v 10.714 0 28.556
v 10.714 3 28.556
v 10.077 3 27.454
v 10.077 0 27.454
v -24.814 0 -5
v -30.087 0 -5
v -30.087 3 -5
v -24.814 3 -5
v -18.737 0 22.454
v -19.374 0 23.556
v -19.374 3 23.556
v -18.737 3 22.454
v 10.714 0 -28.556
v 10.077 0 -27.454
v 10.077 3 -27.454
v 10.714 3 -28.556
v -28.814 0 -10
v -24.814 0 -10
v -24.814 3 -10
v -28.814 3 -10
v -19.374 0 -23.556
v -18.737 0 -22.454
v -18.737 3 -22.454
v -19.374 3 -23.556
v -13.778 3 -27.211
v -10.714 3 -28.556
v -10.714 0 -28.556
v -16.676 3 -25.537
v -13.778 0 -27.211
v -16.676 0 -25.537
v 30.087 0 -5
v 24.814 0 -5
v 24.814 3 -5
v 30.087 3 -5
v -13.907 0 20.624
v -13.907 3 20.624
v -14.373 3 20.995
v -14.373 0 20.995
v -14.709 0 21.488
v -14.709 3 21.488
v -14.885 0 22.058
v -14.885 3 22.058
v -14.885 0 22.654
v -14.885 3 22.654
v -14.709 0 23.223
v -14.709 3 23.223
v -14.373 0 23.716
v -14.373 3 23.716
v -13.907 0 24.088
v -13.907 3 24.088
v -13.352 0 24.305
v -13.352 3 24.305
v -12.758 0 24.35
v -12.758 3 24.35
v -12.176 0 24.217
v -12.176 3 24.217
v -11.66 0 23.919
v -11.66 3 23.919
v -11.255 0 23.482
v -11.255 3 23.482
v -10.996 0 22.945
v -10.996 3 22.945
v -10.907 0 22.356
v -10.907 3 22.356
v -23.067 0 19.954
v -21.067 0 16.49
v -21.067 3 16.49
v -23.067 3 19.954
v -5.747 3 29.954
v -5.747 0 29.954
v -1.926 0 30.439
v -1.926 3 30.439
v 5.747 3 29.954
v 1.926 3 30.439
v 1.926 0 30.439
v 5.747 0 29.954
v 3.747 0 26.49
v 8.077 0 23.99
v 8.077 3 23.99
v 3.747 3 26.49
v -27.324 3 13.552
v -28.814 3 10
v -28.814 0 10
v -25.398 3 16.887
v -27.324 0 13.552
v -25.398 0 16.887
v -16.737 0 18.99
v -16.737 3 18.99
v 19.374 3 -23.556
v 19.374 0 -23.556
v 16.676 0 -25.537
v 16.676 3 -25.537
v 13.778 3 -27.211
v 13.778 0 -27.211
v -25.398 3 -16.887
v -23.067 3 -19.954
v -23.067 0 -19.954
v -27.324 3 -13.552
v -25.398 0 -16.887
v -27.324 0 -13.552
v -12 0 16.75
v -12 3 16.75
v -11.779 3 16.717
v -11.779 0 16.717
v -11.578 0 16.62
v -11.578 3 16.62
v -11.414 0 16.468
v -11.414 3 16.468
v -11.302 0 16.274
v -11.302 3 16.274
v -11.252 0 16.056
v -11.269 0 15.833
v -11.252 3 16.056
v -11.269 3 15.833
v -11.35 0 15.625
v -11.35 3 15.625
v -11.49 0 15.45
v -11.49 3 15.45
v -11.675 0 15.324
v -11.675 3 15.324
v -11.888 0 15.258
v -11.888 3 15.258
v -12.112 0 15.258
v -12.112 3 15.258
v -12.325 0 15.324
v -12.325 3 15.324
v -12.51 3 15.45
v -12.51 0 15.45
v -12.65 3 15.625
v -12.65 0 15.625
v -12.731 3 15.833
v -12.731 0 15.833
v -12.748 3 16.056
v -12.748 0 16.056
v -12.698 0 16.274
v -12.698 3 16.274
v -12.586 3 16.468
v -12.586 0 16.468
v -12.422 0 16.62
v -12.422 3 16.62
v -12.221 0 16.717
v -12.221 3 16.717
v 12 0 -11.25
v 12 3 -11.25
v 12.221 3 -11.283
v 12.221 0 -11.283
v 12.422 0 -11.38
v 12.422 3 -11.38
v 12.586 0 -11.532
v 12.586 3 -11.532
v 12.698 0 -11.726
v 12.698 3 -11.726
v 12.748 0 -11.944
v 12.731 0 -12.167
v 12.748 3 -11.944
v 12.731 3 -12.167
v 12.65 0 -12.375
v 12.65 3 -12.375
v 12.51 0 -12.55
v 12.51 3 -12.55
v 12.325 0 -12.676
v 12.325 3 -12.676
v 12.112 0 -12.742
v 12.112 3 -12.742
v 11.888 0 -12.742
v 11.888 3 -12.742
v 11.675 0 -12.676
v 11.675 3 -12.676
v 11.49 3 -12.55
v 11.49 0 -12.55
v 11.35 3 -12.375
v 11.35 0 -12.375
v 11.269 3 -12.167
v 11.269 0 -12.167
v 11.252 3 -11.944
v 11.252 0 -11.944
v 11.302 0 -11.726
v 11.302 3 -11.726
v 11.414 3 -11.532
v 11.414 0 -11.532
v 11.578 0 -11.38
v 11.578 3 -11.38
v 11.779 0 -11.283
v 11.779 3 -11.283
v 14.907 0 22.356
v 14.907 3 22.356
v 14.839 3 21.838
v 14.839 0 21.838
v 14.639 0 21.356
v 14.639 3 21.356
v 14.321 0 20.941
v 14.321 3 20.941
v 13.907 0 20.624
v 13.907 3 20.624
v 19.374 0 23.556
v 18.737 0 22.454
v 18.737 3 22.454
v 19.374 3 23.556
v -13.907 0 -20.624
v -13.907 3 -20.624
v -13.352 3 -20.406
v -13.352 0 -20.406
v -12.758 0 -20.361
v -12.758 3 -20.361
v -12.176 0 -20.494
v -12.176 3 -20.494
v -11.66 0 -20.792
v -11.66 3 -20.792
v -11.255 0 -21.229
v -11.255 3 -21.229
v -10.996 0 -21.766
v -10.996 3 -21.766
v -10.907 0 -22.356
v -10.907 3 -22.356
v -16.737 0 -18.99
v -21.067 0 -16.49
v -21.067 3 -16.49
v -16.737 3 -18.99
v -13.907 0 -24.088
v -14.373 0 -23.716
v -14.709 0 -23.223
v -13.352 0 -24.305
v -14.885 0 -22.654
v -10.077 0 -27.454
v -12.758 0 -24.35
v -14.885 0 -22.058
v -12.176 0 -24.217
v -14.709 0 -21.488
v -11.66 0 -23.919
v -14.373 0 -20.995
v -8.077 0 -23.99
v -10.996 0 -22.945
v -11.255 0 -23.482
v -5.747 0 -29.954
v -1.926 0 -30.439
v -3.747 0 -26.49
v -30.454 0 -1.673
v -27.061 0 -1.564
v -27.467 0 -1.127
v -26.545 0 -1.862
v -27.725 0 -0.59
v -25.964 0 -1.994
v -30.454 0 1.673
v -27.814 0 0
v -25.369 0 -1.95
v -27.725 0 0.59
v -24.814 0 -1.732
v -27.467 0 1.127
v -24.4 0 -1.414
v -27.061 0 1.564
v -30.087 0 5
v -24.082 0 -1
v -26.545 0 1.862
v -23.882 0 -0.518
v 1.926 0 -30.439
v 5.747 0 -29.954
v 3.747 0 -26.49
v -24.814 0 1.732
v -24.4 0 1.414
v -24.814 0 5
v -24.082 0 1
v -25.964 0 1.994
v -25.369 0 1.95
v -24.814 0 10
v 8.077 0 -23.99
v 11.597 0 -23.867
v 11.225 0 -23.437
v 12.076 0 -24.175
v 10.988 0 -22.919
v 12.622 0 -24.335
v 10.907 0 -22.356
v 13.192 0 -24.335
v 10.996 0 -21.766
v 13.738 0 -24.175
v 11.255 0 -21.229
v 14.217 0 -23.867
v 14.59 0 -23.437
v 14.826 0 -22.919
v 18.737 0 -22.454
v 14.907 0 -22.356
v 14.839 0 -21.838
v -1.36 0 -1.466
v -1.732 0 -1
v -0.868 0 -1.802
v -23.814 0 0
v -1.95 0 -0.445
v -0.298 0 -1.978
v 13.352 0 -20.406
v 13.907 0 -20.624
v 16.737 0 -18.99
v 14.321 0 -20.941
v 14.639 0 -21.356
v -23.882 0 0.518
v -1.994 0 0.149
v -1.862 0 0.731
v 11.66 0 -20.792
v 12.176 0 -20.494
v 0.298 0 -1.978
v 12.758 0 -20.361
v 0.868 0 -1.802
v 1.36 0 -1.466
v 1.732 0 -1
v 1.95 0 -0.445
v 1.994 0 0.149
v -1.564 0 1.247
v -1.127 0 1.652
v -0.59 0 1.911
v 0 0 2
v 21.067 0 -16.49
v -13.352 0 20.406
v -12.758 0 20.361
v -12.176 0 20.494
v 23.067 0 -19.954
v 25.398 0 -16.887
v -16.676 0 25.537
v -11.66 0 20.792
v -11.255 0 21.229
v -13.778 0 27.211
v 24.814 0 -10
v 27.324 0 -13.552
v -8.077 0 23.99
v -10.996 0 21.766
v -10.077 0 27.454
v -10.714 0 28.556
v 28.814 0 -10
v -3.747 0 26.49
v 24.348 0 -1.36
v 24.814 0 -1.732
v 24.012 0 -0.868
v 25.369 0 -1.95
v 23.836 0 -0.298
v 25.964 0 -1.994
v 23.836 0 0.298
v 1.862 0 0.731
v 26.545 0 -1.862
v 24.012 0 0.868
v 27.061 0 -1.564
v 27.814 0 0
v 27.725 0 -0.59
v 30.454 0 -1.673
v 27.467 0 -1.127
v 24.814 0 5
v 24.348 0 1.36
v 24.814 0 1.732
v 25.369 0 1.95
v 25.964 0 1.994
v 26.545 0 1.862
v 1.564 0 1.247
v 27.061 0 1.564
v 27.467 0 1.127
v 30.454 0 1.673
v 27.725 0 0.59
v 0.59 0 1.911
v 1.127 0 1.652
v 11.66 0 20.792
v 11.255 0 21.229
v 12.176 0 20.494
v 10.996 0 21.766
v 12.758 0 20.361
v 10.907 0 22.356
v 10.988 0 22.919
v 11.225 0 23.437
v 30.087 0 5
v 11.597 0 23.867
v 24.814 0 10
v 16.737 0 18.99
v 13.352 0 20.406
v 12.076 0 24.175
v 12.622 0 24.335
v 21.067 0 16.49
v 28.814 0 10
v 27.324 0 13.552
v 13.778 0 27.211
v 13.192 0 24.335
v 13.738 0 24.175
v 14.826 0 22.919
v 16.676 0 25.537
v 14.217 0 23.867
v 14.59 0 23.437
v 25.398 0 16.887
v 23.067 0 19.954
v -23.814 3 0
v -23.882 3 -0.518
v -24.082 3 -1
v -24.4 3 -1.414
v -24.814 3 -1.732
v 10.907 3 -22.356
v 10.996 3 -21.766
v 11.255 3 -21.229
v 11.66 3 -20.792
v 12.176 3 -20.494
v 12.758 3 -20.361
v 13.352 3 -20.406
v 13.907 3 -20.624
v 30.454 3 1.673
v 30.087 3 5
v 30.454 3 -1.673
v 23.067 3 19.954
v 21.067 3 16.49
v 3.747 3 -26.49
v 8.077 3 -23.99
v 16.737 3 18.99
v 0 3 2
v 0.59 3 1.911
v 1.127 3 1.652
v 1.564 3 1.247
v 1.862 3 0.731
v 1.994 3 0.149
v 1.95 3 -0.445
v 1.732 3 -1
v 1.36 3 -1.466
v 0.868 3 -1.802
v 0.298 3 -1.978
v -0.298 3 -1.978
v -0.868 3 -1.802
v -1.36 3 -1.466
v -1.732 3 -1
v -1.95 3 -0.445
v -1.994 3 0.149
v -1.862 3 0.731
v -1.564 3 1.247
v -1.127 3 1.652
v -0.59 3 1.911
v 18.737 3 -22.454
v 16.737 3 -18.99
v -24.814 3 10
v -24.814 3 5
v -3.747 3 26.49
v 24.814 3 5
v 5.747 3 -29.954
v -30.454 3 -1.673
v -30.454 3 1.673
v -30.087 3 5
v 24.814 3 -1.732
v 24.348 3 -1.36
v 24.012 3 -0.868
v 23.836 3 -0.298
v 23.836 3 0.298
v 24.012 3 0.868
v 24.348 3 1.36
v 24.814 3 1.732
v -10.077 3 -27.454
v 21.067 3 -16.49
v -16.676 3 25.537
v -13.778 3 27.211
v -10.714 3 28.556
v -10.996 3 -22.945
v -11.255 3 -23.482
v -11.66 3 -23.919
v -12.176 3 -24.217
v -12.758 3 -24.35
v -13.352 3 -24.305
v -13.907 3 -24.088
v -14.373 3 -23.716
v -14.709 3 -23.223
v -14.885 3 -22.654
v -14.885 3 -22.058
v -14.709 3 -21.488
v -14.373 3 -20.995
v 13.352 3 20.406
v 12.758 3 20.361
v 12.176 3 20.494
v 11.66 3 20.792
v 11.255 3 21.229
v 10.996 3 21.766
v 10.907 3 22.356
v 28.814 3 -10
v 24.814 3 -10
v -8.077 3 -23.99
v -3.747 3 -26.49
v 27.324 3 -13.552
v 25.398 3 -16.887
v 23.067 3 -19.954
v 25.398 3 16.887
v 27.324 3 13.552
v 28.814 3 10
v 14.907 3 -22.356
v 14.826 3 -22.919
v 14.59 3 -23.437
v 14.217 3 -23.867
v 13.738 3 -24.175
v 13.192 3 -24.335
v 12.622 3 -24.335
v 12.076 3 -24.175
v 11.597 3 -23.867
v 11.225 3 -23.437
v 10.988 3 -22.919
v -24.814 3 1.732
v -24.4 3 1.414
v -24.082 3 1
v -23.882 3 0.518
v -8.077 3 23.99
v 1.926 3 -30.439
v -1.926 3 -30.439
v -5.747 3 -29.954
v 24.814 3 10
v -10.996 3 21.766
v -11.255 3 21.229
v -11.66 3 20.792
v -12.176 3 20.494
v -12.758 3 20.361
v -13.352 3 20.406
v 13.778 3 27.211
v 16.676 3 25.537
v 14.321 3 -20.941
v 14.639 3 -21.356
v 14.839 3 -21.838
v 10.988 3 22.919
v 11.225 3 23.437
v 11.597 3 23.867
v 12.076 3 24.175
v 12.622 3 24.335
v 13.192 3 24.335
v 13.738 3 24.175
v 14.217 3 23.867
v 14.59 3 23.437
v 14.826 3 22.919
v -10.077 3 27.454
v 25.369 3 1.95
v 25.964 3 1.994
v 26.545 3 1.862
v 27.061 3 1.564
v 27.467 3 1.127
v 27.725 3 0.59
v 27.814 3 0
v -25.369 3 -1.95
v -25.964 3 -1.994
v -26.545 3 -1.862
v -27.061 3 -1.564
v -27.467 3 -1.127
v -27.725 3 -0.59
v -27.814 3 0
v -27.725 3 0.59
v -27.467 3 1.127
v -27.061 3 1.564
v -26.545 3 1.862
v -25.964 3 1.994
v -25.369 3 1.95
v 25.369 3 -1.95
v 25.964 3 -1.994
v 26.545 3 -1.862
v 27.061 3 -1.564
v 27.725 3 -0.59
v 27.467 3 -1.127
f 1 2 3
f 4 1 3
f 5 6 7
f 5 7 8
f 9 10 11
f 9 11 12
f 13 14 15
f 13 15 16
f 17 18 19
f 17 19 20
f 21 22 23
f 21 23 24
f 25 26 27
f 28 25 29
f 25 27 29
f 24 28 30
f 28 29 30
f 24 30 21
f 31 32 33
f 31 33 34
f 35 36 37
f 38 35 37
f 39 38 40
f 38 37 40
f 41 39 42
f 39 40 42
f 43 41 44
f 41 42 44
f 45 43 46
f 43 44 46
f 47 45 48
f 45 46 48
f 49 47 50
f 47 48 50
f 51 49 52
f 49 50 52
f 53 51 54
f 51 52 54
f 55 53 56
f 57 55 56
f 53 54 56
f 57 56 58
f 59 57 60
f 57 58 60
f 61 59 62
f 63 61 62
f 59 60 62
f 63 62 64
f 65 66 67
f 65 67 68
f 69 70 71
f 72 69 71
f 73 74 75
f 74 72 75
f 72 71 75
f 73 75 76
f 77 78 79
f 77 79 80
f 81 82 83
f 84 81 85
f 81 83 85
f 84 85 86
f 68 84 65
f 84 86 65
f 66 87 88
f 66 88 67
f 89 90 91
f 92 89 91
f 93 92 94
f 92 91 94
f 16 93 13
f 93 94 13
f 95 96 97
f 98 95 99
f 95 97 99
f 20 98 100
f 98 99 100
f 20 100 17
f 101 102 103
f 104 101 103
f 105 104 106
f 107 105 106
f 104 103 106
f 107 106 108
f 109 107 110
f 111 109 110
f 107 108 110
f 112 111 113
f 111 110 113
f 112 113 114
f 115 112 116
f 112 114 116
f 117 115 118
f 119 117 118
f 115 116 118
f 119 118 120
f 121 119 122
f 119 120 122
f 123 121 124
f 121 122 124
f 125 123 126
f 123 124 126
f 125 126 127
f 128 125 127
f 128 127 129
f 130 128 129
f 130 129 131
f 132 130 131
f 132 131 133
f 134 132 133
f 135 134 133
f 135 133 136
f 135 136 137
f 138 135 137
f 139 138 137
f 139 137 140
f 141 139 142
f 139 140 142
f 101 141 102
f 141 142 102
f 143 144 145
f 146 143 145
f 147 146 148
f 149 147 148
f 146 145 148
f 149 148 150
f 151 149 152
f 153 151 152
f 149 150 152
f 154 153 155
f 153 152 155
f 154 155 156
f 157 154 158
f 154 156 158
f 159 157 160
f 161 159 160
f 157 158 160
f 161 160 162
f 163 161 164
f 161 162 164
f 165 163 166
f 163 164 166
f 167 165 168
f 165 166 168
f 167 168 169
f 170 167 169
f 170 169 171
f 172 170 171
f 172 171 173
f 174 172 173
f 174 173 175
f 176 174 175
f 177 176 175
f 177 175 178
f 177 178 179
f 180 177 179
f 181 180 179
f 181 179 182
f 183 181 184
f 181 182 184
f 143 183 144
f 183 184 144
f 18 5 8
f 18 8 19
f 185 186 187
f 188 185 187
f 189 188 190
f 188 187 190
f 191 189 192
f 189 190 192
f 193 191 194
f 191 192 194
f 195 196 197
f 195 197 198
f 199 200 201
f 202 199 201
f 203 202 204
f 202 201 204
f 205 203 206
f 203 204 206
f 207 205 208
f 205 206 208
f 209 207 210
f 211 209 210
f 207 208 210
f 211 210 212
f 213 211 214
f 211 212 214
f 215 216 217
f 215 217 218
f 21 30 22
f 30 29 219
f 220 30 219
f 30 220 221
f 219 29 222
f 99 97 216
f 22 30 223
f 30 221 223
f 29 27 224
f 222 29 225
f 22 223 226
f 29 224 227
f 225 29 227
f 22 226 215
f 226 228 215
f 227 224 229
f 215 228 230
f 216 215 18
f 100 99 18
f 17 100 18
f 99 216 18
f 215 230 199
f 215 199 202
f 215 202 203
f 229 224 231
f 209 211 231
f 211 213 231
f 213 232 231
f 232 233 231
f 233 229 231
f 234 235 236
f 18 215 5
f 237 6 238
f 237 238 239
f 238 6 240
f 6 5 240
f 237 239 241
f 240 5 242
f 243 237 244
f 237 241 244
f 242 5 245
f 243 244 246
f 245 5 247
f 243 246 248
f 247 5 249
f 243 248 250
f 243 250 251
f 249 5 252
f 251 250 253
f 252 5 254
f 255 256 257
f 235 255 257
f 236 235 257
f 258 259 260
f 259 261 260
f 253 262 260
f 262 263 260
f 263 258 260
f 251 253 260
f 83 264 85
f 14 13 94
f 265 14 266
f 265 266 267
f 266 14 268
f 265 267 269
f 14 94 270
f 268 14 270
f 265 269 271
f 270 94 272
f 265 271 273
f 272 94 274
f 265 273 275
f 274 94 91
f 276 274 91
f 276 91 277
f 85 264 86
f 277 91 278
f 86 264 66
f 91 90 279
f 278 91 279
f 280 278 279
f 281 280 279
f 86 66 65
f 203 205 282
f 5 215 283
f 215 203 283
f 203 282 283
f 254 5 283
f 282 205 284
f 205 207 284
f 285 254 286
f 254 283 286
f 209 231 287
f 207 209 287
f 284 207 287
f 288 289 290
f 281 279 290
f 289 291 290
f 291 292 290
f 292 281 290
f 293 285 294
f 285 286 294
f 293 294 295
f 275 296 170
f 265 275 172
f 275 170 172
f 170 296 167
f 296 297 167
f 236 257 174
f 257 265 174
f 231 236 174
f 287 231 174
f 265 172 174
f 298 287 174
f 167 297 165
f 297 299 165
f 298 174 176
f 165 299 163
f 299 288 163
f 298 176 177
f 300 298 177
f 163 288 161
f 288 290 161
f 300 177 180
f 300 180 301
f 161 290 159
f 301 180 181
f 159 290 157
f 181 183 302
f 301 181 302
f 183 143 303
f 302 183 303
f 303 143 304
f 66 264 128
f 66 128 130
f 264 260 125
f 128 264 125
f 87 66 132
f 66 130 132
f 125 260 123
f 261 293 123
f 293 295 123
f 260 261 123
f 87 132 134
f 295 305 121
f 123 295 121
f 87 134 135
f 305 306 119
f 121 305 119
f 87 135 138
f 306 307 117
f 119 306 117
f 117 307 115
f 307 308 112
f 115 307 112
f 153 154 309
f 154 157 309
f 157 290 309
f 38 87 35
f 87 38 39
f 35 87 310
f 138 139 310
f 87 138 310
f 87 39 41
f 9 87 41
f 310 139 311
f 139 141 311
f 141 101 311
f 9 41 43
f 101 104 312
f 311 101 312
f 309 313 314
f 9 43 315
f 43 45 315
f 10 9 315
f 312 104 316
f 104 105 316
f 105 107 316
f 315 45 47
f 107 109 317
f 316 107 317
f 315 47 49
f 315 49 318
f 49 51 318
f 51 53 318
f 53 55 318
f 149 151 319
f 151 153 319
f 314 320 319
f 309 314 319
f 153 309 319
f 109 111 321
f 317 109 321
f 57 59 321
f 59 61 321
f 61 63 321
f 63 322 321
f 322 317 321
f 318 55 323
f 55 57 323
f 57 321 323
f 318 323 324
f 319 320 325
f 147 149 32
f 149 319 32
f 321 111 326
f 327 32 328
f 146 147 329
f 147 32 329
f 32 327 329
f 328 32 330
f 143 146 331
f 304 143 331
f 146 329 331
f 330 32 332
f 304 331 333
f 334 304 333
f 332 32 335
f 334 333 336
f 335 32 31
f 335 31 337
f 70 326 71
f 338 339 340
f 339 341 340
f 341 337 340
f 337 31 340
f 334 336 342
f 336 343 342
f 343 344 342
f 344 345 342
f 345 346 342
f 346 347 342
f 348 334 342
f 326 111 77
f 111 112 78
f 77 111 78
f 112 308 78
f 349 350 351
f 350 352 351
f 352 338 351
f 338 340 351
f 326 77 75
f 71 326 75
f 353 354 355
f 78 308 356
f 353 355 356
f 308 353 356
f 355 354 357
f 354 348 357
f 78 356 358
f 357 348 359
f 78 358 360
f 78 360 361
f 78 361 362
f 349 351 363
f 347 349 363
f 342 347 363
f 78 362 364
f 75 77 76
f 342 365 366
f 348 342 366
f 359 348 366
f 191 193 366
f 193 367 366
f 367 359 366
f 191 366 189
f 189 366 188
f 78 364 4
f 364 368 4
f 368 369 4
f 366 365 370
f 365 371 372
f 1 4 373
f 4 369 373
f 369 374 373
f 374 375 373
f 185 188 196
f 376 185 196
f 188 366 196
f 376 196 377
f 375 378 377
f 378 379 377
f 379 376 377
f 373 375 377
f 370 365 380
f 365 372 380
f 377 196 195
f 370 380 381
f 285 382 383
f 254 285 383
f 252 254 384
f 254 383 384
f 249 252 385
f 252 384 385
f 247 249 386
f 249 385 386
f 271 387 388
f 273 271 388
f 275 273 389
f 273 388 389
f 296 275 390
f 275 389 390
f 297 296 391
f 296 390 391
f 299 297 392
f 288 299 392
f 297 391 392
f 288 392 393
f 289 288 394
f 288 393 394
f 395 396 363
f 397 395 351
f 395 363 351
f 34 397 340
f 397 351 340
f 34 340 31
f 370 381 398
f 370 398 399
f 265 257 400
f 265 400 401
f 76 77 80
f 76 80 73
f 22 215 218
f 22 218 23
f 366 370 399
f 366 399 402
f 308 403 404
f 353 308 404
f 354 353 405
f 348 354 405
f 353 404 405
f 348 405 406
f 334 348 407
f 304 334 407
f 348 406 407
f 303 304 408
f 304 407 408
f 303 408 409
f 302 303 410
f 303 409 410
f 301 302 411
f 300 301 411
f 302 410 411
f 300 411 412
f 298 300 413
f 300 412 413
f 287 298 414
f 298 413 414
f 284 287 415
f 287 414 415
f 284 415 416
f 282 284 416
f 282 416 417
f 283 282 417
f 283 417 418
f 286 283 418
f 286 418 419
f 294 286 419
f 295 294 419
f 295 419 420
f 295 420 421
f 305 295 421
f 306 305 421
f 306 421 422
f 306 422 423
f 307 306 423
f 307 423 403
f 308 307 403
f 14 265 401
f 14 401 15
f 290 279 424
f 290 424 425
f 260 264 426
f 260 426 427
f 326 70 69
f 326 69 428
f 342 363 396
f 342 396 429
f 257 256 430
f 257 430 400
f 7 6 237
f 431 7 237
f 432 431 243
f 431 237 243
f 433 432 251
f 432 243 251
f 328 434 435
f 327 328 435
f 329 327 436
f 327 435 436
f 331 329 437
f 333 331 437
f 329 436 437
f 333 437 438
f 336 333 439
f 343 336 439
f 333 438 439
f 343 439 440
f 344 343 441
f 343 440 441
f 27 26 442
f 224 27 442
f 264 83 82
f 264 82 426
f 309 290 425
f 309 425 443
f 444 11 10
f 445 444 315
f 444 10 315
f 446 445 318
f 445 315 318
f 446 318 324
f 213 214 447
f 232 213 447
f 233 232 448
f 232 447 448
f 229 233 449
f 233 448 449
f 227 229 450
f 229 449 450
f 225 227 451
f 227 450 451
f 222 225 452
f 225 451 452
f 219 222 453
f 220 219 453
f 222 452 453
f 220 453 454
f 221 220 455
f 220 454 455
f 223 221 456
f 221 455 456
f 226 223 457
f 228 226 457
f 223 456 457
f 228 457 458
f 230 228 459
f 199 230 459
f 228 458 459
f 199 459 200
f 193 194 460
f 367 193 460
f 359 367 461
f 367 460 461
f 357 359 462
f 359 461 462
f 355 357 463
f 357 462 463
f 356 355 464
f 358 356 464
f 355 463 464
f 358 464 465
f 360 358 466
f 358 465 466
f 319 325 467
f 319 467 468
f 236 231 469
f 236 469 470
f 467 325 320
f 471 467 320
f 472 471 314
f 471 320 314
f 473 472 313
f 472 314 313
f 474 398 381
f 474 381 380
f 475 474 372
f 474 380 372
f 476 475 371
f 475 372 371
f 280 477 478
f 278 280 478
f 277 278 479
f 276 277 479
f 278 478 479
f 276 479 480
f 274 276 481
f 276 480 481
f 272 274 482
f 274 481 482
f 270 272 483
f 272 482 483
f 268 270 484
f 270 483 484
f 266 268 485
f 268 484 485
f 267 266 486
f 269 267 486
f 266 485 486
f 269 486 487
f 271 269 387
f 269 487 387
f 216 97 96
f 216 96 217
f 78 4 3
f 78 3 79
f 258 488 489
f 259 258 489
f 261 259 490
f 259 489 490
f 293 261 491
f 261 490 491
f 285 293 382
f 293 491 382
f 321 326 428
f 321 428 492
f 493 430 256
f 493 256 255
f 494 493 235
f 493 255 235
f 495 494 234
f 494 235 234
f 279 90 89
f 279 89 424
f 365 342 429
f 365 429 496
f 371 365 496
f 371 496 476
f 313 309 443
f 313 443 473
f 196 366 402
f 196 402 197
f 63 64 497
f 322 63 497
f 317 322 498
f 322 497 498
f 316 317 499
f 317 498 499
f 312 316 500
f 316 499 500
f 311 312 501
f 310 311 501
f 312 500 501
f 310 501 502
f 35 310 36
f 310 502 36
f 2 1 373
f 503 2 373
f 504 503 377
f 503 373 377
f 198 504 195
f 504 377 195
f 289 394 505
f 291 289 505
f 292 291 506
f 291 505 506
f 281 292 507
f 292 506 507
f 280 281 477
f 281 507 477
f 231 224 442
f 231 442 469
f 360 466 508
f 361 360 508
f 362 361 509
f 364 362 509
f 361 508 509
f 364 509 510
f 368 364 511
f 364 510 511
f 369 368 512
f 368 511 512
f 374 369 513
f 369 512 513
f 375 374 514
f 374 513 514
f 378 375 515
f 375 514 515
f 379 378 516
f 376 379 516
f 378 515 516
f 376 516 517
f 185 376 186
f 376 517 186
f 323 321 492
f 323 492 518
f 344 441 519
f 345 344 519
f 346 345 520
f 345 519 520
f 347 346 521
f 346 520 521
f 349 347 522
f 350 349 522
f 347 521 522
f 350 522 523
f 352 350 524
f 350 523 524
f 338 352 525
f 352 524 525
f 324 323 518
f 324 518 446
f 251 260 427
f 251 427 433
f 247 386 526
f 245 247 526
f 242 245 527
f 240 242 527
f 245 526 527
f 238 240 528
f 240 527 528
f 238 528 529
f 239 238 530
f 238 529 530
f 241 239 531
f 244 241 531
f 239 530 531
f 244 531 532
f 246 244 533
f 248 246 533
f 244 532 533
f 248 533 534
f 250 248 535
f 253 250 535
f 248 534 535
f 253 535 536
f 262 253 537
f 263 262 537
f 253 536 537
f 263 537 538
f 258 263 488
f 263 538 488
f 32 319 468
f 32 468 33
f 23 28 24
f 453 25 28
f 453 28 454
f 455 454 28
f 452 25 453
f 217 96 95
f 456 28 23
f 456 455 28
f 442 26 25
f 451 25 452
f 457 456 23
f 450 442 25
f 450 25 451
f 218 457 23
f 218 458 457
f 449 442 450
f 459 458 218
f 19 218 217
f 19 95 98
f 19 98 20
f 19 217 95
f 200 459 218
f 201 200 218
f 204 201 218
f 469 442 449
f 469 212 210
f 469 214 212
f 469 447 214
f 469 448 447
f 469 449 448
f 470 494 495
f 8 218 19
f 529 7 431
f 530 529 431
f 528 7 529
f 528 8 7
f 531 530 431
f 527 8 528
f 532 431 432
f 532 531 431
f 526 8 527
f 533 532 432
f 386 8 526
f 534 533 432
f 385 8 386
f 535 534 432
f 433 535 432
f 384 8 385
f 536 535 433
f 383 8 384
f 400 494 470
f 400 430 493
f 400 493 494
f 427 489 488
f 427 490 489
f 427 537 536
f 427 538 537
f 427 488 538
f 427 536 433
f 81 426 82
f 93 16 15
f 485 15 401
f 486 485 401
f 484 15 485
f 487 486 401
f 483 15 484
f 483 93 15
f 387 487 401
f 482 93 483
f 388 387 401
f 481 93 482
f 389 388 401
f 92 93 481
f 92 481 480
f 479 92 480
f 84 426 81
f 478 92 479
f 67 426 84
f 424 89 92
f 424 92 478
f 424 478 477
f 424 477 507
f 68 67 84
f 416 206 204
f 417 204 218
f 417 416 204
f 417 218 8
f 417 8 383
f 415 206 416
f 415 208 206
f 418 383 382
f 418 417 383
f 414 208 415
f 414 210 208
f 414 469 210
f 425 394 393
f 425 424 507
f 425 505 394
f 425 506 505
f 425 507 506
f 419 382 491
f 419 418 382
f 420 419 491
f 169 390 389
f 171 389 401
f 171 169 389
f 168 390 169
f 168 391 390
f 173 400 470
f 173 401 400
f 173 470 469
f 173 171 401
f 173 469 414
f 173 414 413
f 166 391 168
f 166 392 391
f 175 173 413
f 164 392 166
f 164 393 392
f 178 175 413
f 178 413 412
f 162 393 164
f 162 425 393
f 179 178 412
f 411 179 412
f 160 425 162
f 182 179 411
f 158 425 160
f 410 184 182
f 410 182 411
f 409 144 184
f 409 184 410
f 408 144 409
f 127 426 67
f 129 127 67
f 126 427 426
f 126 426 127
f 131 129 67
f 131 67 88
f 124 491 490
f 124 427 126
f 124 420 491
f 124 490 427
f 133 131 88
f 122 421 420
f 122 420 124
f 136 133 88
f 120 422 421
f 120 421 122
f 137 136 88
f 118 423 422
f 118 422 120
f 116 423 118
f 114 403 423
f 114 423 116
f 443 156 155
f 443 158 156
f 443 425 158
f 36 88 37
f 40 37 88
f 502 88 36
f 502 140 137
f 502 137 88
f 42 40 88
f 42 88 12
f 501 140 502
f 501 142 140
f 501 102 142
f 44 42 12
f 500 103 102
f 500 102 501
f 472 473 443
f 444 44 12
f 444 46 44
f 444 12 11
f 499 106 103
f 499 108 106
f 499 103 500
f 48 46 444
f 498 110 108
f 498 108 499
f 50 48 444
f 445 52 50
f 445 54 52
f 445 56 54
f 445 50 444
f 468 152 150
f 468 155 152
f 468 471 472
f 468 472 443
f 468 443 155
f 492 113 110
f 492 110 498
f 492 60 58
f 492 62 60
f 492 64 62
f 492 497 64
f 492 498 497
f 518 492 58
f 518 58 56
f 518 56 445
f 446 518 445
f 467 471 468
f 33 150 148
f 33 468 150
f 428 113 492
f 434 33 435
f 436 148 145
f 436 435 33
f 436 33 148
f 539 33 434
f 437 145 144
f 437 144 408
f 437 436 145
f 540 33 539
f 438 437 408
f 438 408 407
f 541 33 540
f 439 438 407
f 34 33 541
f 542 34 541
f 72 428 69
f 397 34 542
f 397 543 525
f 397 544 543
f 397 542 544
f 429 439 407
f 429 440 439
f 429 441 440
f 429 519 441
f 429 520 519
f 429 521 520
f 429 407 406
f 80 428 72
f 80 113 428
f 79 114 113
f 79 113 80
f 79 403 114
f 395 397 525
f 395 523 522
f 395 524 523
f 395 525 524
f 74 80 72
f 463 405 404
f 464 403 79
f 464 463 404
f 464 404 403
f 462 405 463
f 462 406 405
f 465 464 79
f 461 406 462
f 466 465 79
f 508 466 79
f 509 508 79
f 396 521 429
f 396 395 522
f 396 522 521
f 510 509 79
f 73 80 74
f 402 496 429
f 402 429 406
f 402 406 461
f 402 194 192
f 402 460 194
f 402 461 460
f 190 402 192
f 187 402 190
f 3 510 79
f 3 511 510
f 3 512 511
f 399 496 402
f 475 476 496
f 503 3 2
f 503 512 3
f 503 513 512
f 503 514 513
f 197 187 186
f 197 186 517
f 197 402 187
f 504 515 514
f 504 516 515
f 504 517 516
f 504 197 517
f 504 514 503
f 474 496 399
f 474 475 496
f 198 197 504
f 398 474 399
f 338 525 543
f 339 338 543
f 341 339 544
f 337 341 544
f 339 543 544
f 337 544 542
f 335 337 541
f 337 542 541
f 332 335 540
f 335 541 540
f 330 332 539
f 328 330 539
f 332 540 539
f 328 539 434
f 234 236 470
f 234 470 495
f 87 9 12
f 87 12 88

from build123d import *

# Parameters (mm, degrees)
CROQUIS1_R              = 30.5
SALIENTE_EXTRUIR1_DEPTH = 3
CROQUIS2_R              = 2
CORTAR_EXTRUIR1_DEPTH   = 4
CORTAR_EXTRUIR3_START   = -4
CORTAR_EXTRUIR3_DEPTH   = 4
CORTAR_EXTRUIR4_DEPTH   = 10
CROQUIS8_R              = 0.75
CORTAR_EXTRUIR5_DEPTH   = 3


with BuildPart() as part:
    # Croquis1 → Saliente-Extruir1 (new body)
    with BuildSketch(Plane(origin=(0, 0, 0), x_dir=(1, 0, 0), z_dir=(0, 1, 0))):
        with Locations(Location((0, 0, 0), (0, 0, 270))):
            Circle(CROQUIS1_R)
    extrude(amount=SALIENTE_EXTRUIR1_DEPTH)

    # Croquis2 → Cortar-Extruir1 (cut)
    with BuildSketch(Plane(origin=(0, 3, 0), x_dir=(1, 0, 0), z_dir=(0, 1, 0))):
        with Locations(Location((0, 0, 0), (0, 0, 270))):
            Circle(CROQUIS2_R)
    extrude(amount=-CORTAR_EXTRUIR1_DEPTH, mode=Mode.SUBTRACT)

    # Croquis5 → Cortar-Extruir3 (cut)
    with BuildSketch(Plane(origin=(0, 3, 0), x_dir=(1, 0, 0), z_dir=(0, 1, 0)).offset(CORTAR_EXTRUIR3_START)):
        with BuildLine():
            ThreePointArc((-28.814059068, 10), (-29.556634924, 7.526973624), (-30.087372767, 5))
            Line((-30.087372767, 5), (-28.814059068, 5))
            Line((-28.814059068, 5), (-24.814059068, 5))
            Line((-24.814059068, 5), (-24.814059068, 10))
            Line((-24.814059068, 10), (-28.814059068, 10))
        make_face()
        with BuildLine():
            Line((28.814059068, 5), (30.087372767, 5))
            ThreePointArc((30.087372767, 5), (29.556634924, 7.526973624), (28.814059068, 10))
            Line((28.814059068, 10), (24.814059068, 10))
            Line((24.814059068, 10), (24.814059068, 5))
            Line((24.814059068, 5), (28.814059068, 5))
        make_face()
        with BuildLine():
            Line((30.087372767, -5), (28.814059068, -5))
            Line((28.814059068, -5), (24.814059068, -5))
            Line((24.814059068, -5), (24.814059068, -10))
            Line((24.814059068, -10), (28.814059068, -10))
            ThreePointArc((28.814059068, -10), (29.556634924, -7.526973624), (30.087372767, -5))
        make_face()
        with BuildLine():
            ThreePointArc((19.373813402, -23.556429149), (21.296867835, -21.833309883), (23.067283572, -19.953707139))
            Line((23.067283572, -19.953707139), (21.067283572, -16.489605524))
            Line((21.067283572, -16.489605524), (16.737156553, -18.989605524))
            Line((16.737156553, -18.989605524), (18.737156553, -22.453707139))
            Line((18.737156553, -22.453707139), (19.373813402, -23.556429149))
        make_face()
        with BuildLine():
            ThreePointArc((5.746775496, -29.953707139), (8.25976709, -29.360283507), (10.713559364, -28.556429149))
            Line((10.713559364, -28.556429149), (10.076902515, -27.453707139))
            Line((10.076902515, -27.453707139), (8.076902515, -23.989605524))
            Line((8.076902515, -23.989605524), (3.746775496, -26.489605524))
            Line((3.746775496, -26.489605524), (5.746775496, -29.953707139))
        make_face()
        with BuildLine():
            ThreePointArc((-10.713559364, -28.556429149), (-8.25976709, -29.360283507), (-5.746775496, -29.953707139))
            Line((-5.746775496, -29.953707139), (-3.746775496, -26.489605524))
            Line((-3.746775496, -26.489605524), (-8.076902515, -23.989605524))
            Line((-8.076902515, -23.989605524), (-10.076902515, -27.453707139))
            Line((-10.076902515, -27.453707139), (-10.713559364, -28.556429149))
        make_face()
        with BuildLine():
            ThreePointArc((-23.067283572, -19.953707139), (-21.296867835, -21.833309883), (-19.373813402, -23.556429149))
            Line((-19.373813402, -23.556429149), (-18.737156553, -22.453707139))
            Line((-18.737156553, -22.453707139), (-16.737156553, -18.989605524))
            Line((-16.737156553, -18.989605524), (-21.067283572, -16.489605524))
            Line((-21.067283572, -16.489605524), (-23.067283572, -19.953707139))
        make_face()
        with BuildLine():
            ThreePointArc((-30.087372767, -5), (-29.556634924, -7.526973624), (-28.814059068, -10))
            Line((-28.814059068, -10), (-24.814059068, -10))
            Line((-24.814059068, -10), (-24.814059068, -5))
            Line((-24.814059068, -5), (-28.814059068, -5))
            Line((-28.814059068, -5), (-30.087372767, -5))
        make_face()
        with BuildLine():
            Line((-18.737156553, 22.453707139), (-19.373813402, 23.556429149))
            ThreePointArc((-19.373813402, 23.556429149), (-21.296867835, 21.833309883), (-23.067283572, 19.953707139))
            Line((-23.067283572, 19.953707139), (-21.067283572, 16.489605524))
            Line((-21.067283572, 16.489605524), (-16.737156553, 18.989605524))
            Line((-16.737156553, 18.989605524), (-18.737156553, 22.453707139))
        make_face()
        with BuildLine():
            Line((-3.746775496, 26.489605524), (-5.746775496, 29.953707139))
            ThreePointArc((-5.746775496, 29.953707139), (-8.25976709, 29.360283507), (-10.713559364, 28.556429149))
            Line((-10.713559364, 28.556429149), (-10.076902515, 27.453707139))
            Line((-10.076902515, 27.453707139), (-8.076902515, 23.989605524))
            Line((-8.076902515, 23.989605524), (-3.746775496, 26.489605524))
        make_face()
        with BuildLine():
            Line((10.076902515, 27.453707139), (10.713559364, 28.556429149))
            ThreePointArc((10.713559364, 28.556429149), (8.25976709, 29.360283507), (5.746775496, 29.953707139))
            Line((5.746775496, 29.953707139), (3.746775496, 26.489605524))
            Line((3.746775496, 26.489605524), (8.076902515, 23.989605524))
            Line((8.076902515, 23.989605524), (10.076902515, 27.453707139))
        make_face()
        with BuildLine():
            Line((21.067283572, 16.489605524), (23.067283572, 19.953707139))
            ThreePointArc((23.067283572, 19.953707139), (21.296867835, 21.833309883), (19.373813402, 23.556429149))
            Line((19.373813402, 23.556429149), (18.737156553, 22.453707139))
            Line((18.737156553, 22.453707139), (16.737156553, 18.989605524))
            Line((16.737156553, 18.989605524), (21.067283572, 16.489605524))
        make_face()
    extrude(amount=CORTAR_EXTRUIR3_DEPTH, mode=Mode.SUBTRACT)

    # Croquis7 → Cortar-Extruir4 (cut)
    with BuildSketch(Plane(origin=(0, 3, 0), x_dir=(1, 0, 0), z_dir=(0, 1, 0))):
        with BuildLine():
            ThreePointArc((-13.907029535, 20.623580122), (-11.907029535, 20.623580122), (-10.907029535, 22.355630929))
            Line((-10.907029535, 22.355630929), (-12.907029535, 22.355630929))
            Line((-12.907029535, 22.355630929), (-13.907029535, 20.623580122))
        make_face()
        with BuildLine():
            Line((-12.907029535, 22.355630929), (-10.907029535, 22.355630929))
            ThreePointArc((-10.907029535, 22.355630929), (-13.907029535, 24.087681737), (-13.907029535, 20.623580122))
            Line((-13.907029535, 20.623580122), (-12.907029535, 22.355630929))
        make_face()
        with BuildLine():
            ThreePointArc((-23.81405907, 0), (-24.082008262, 1), (-24.81405907, 1.732050808))
            Line((-24.81405907, 1.732050808), (-25.81405907, 0))
            Line((-25.81405907, 0), (-24.81405907, -1.732050808))
            ThreePointArc((-24.81405907, -1.732050808), (-24.082008262, -1), (-23.81405907, 0))
        make_face()
        with BuildLine():
            Line((-25.81405907, 0), (-24.81405907, 1.732050808))
            ThreePointArc((-24.81405907, 1.732050808), (-27.81405907, 0), (-24.81405907, -1.732050808))
            Line((-24.81405907, -1.732050808), (-25.81405907, 0))
        make_face()
        with BuildLine():
            ThreePointArc((10.907029535, 22.355630929), (11.907029535, 20.623580122), (13.907029535, 20.623580122))
            Line((13.907029535, 20.623580122), (12.907029535, 22.355630929))
            Line((12.907029535, 22.355630929), (10.907029535, 22.355630929))
        make_face()
        with BuildLine():
            Line((12.907029535, 22.355630929), (13.907029535, 20.623580122))
            ThreePointArc((13.907029535, 20.623580122), (14.639080343, 21.355630929), (14.907029535, 22.355630929))
            ThreePointArc((14.907029535, 22.355630929), (12.907029535, 24.355630929), (10.907029535, 22.355630929))
            Line((10.907029535, 22.355630929), (12.907029535, 22.355630929))
        make_face()
        with BuildLine():
            Line((24.81405907, -1.732050808), (25.81405907, 0))
            Line((25.81405907, 0), (24.81405907, 1.732050808))
            ThreePointArc((24.81405907, 1.732050808), (23.81405907, 0), (24.81405907, -1.732050808))
        make_face()
        with BuildLine():
            Line((24.81405907, 1.732050808), (25.81405907, 0))
            Line((25.81405907, 0), (24.81405907, -1.732050808))
            ThreePointArc((24.81405907, -1.732050808), (26.81405907, -1.732050808), (27.81405907, 0))
            ThreePointArc((27.81405907, 0), (26.81405907, 1.732050808), (24.81405907, 1.732050808))
        make_face()
        with BuildLine():
            ThreePointArc((-13.907029535, -20.623580122), (-13.907029535, -24.087681737), (-10.907029535, -22.355630929))
            Line((-10.907029535, -22.355630929), (-12.907029535, -22.355630929))
            Line((-12.907029535, -22.355630929), (-13.907029535, -20.623580122))
        make_face()
        with BuildLine():
            Line((-12.907029535, -22.355630929), (-10.907029535, -22.355630929))
            ThreePointArc((-10.907029535, -22.355630929), (-11.907029535, -20.623580122), (-13.907029535, -20.623580122))
            Line((-13.907029535, -20.623580122), (-12.907029535, -22.355630929))
        make_face()
        with BuildLine():
            ThreePointArc((14.907029535, -22.355630929), (14.639080343, -21.355630929), (13.907029535, -20.623580122))
            Line((13.907029535, -20.623580122), (12.907029535, -22.355630929))
            Line((12.907029535, -22.355630929), (10.907029535, -22.355630929))
            ThreePointArc((10.907029535, -22.355630929), (12.907029535, -24.355630929), (14.907029535, -22.355630929))
        make_face()
        with BuildLine():
            Line((12.907029535, -22.355630929), (13.907029535, -20.623580122))
            ThreePointArc((13.907029535, -20.623580122), (11.907029535, -20.623580122), (10.907029535, -22.355630929))
            Line((10.907029535, -22.355630929), (12.907029535, -22.355630929))
        make_face()
    extrude(amount=-CORTAR_EXTRUIR4_DEPTH, mode=Mode.SUBTRACT)

    # Croquis8 → Cortar-Extruir5 (cut)
    with BuildSketch(Plane(origin=(0, 3, 0), x_dir=(1, 0, 0), z_dir=(0, 1, 0))):
        with Locations(Location((12, 12, 0), (0, 0, 270))):
            Circle(CROQUIS8_R)
        with Locations(Location((-12, -16, 0), (0, 0, 270))):
            Circle(CROQUIS8_R)
    extrude(amount=-CORTAR_EXTRUIR5_DEPTH, mode=Mode.SUBTRACT)


solid = part.part
